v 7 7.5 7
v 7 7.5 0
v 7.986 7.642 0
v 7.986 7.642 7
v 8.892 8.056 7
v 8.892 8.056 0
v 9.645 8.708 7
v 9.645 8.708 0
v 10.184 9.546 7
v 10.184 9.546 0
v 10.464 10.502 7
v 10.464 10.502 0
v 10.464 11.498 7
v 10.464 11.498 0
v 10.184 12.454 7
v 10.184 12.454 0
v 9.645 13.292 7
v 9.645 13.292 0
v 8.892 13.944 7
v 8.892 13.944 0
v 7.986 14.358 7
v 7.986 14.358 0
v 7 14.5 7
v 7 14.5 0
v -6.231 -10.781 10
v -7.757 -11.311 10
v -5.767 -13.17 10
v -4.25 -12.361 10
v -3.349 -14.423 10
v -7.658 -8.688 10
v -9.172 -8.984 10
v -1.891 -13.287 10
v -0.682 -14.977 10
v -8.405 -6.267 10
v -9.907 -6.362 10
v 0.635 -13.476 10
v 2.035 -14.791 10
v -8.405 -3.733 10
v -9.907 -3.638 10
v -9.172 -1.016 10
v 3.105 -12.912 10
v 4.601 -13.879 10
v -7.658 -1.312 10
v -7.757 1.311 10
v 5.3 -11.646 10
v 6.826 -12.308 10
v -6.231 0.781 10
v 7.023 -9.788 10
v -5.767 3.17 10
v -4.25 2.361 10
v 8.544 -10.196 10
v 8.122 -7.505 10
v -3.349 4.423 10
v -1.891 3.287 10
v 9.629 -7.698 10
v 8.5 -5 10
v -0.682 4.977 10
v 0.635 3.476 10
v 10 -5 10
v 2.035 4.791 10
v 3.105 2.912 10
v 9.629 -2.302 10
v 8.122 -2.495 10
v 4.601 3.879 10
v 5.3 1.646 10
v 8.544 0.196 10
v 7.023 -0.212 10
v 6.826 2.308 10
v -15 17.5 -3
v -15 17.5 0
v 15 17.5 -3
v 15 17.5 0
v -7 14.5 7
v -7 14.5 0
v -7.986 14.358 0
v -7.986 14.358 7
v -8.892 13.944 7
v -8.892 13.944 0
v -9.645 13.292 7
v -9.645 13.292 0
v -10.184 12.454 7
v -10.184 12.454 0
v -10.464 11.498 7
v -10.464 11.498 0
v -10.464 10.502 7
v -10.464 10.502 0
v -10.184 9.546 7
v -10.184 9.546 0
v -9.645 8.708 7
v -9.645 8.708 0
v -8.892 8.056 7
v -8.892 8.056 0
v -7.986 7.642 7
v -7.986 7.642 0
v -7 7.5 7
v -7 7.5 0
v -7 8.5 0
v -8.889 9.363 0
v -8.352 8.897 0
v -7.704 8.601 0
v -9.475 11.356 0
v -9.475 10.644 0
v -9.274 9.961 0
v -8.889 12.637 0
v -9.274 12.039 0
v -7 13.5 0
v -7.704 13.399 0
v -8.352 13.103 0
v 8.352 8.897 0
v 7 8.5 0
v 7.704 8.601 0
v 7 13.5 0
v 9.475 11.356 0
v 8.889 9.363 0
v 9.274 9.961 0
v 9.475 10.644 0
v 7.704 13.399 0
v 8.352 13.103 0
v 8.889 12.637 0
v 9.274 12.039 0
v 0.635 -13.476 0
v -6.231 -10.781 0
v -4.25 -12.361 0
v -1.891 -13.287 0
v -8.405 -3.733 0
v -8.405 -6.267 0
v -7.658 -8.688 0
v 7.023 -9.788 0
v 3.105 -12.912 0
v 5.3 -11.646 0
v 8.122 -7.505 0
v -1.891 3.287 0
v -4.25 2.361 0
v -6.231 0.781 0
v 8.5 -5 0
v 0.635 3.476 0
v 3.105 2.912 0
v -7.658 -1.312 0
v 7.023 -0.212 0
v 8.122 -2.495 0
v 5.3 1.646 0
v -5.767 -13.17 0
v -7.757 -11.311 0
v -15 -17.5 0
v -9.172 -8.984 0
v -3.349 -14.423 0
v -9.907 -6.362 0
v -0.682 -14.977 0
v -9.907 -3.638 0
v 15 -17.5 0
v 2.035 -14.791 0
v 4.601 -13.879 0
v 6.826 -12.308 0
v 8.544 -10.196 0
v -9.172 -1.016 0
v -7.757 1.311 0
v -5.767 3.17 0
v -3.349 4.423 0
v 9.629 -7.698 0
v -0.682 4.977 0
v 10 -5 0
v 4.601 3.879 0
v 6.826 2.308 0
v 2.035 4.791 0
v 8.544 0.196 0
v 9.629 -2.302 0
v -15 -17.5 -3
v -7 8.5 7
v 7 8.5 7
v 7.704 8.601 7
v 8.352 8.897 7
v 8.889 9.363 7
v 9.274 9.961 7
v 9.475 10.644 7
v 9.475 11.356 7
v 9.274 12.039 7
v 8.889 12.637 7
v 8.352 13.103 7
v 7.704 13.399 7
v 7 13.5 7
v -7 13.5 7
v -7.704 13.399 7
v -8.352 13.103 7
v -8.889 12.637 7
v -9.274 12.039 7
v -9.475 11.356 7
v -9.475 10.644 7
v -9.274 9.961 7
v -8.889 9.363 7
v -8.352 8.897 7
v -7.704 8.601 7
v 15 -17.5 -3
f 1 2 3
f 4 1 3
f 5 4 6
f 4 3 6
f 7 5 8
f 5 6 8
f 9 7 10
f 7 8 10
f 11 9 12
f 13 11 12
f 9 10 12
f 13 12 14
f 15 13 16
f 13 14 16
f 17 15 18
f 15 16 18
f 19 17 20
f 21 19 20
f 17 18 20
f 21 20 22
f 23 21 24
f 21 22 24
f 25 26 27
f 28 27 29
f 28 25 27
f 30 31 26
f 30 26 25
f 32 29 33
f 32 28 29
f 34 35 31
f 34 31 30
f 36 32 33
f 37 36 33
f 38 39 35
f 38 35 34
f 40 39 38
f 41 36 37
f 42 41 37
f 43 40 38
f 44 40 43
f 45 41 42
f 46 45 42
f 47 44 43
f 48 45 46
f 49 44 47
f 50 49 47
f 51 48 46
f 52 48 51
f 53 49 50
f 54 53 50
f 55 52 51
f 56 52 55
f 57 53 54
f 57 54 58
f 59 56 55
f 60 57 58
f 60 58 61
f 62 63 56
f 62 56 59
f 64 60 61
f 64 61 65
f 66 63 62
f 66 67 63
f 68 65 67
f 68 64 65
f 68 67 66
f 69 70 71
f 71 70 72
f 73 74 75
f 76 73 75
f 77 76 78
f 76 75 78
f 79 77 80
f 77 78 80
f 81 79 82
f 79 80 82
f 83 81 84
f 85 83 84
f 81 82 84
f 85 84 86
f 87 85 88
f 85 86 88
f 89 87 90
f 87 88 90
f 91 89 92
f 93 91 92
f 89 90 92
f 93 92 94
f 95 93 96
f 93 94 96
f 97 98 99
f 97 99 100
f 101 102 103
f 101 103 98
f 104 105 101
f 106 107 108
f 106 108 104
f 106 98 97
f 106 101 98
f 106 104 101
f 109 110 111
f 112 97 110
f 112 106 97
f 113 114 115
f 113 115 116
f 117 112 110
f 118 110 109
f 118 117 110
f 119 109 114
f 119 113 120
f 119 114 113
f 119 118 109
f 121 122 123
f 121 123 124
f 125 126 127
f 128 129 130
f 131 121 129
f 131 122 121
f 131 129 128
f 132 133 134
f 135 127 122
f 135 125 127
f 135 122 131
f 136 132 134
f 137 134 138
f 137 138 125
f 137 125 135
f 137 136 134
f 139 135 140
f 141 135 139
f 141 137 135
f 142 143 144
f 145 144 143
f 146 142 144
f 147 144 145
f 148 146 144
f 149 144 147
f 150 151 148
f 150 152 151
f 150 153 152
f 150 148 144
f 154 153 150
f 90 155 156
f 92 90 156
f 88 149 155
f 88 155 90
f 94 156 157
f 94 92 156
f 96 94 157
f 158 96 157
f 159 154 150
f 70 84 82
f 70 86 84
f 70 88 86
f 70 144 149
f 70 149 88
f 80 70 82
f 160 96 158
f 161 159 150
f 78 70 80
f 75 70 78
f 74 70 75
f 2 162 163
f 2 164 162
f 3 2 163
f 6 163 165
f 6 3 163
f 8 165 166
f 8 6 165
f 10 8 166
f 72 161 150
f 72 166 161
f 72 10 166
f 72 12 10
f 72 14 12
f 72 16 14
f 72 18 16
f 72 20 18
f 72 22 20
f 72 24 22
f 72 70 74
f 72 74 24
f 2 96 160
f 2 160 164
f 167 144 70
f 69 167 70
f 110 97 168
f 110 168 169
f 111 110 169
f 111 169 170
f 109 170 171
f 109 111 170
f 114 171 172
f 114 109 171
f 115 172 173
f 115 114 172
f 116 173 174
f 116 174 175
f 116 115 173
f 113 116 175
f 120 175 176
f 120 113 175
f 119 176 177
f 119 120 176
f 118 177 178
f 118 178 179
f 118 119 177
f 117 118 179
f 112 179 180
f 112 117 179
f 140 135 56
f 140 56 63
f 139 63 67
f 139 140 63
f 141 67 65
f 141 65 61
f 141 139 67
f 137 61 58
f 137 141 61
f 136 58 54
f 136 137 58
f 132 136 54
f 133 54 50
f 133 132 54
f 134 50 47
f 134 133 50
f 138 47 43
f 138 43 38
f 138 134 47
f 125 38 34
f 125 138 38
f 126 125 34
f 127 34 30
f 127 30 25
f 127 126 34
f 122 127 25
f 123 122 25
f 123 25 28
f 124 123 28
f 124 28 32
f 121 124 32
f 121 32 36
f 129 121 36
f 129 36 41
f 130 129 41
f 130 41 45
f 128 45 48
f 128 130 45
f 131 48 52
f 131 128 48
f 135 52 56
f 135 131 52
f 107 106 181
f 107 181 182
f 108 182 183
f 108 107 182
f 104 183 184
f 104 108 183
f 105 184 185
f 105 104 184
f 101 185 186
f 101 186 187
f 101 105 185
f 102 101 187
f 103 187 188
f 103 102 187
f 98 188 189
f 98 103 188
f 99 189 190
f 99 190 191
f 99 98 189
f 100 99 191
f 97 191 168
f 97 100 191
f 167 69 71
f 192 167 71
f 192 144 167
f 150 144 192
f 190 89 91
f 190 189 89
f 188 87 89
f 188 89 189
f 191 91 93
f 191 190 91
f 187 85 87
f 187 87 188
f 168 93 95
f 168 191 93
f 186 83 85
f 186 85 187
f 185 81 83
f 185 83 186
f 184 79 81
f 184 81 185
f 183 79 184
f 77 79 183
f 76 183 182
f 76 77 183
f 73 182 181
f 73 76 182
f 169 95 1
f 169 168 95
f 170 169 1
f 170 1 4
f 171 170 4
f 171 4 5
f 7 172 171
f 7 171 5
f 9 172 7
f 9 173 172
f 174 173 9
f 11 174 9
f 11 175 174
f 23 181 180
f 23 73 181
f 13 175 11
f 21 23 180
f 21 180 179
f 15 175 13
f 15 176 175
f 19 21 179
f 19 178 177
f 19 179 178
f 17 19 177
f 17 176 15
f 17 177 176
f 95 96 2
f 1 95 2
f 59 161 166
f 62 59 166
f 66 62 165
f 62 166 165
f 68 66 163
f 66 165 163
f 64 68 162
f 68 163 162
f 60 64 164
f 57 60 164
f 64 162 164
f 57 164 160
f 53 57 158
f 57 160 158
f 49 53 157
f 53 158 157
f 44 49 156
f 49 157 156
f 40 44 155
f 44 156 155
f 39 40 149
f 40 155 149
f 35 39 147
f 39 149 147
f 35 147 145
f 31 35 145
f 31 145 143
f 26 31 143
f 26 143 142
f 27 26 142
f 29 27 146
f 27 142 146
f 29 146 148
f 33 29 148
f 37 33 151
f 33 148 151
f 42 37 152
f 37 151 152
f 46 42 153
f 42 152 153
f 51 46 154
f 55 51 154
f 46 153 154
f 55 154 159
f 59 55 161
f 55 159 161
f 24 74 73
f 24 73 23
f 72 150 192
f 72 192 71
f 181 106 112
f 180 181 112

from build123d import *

# Parameters (mm, degrees)
SKETCH_W      = 30
SKETCH_H      = 35
PAD_DEPTH     = 3
SKETCH001_R   = 10
SKETCH001_R_2 = 8.5
PAD001_DEPTH  = 10
PAD002_DEPTH  = 7


with BuildPart() as part:
    # Sketch → Pad (new body)
    with BuildSketch(Plane.XY):
        Rectangle(SKETCH_W, SKETCH_H)
    extrude(amount=-PAD_DEPTH)

    # Sketch001 → Pad001 (join)
    with BuildSketch(Plane.XY):
        with Locations((0, -5)):
            Circle(SKETCH001_R)
        with Locations((0, -5)):
            Circle(SKETCH001_R_2, mode=Mode.SUBTRACT)
    extrude(amount=PAD001_DEPTH)

    # Sketch002 → Pad002 (join)
    with BuildSketch(Plane.XY):
        with BuildLine():
            ThreePointArc((-7, 14.5), (-10.5, 11), (-7, 7.5))
            Line((-7, 7.5), (7, 7.5))
            ThreePointArc((7, 7.5), (10.5, 11), (7, 14.5))
            Line((-7, 14.5), (7, 14.5))
        make_face()
        with BuildLine():
            ThreePointArc((-7, 13.5), (-9.5, 11), (-7, 8.5))
            Line((-7, 8.5), (7, 8.5))
            ThreePointArc((7, 8.5), (9.5, 11), (7, 13.5))
            Line((-7, 13.5), (7, 13.5))
        make_face(mode=Mode.SUBTRACT)
    extrude(amount=PAD002_DEPTH)


solid = part.part
